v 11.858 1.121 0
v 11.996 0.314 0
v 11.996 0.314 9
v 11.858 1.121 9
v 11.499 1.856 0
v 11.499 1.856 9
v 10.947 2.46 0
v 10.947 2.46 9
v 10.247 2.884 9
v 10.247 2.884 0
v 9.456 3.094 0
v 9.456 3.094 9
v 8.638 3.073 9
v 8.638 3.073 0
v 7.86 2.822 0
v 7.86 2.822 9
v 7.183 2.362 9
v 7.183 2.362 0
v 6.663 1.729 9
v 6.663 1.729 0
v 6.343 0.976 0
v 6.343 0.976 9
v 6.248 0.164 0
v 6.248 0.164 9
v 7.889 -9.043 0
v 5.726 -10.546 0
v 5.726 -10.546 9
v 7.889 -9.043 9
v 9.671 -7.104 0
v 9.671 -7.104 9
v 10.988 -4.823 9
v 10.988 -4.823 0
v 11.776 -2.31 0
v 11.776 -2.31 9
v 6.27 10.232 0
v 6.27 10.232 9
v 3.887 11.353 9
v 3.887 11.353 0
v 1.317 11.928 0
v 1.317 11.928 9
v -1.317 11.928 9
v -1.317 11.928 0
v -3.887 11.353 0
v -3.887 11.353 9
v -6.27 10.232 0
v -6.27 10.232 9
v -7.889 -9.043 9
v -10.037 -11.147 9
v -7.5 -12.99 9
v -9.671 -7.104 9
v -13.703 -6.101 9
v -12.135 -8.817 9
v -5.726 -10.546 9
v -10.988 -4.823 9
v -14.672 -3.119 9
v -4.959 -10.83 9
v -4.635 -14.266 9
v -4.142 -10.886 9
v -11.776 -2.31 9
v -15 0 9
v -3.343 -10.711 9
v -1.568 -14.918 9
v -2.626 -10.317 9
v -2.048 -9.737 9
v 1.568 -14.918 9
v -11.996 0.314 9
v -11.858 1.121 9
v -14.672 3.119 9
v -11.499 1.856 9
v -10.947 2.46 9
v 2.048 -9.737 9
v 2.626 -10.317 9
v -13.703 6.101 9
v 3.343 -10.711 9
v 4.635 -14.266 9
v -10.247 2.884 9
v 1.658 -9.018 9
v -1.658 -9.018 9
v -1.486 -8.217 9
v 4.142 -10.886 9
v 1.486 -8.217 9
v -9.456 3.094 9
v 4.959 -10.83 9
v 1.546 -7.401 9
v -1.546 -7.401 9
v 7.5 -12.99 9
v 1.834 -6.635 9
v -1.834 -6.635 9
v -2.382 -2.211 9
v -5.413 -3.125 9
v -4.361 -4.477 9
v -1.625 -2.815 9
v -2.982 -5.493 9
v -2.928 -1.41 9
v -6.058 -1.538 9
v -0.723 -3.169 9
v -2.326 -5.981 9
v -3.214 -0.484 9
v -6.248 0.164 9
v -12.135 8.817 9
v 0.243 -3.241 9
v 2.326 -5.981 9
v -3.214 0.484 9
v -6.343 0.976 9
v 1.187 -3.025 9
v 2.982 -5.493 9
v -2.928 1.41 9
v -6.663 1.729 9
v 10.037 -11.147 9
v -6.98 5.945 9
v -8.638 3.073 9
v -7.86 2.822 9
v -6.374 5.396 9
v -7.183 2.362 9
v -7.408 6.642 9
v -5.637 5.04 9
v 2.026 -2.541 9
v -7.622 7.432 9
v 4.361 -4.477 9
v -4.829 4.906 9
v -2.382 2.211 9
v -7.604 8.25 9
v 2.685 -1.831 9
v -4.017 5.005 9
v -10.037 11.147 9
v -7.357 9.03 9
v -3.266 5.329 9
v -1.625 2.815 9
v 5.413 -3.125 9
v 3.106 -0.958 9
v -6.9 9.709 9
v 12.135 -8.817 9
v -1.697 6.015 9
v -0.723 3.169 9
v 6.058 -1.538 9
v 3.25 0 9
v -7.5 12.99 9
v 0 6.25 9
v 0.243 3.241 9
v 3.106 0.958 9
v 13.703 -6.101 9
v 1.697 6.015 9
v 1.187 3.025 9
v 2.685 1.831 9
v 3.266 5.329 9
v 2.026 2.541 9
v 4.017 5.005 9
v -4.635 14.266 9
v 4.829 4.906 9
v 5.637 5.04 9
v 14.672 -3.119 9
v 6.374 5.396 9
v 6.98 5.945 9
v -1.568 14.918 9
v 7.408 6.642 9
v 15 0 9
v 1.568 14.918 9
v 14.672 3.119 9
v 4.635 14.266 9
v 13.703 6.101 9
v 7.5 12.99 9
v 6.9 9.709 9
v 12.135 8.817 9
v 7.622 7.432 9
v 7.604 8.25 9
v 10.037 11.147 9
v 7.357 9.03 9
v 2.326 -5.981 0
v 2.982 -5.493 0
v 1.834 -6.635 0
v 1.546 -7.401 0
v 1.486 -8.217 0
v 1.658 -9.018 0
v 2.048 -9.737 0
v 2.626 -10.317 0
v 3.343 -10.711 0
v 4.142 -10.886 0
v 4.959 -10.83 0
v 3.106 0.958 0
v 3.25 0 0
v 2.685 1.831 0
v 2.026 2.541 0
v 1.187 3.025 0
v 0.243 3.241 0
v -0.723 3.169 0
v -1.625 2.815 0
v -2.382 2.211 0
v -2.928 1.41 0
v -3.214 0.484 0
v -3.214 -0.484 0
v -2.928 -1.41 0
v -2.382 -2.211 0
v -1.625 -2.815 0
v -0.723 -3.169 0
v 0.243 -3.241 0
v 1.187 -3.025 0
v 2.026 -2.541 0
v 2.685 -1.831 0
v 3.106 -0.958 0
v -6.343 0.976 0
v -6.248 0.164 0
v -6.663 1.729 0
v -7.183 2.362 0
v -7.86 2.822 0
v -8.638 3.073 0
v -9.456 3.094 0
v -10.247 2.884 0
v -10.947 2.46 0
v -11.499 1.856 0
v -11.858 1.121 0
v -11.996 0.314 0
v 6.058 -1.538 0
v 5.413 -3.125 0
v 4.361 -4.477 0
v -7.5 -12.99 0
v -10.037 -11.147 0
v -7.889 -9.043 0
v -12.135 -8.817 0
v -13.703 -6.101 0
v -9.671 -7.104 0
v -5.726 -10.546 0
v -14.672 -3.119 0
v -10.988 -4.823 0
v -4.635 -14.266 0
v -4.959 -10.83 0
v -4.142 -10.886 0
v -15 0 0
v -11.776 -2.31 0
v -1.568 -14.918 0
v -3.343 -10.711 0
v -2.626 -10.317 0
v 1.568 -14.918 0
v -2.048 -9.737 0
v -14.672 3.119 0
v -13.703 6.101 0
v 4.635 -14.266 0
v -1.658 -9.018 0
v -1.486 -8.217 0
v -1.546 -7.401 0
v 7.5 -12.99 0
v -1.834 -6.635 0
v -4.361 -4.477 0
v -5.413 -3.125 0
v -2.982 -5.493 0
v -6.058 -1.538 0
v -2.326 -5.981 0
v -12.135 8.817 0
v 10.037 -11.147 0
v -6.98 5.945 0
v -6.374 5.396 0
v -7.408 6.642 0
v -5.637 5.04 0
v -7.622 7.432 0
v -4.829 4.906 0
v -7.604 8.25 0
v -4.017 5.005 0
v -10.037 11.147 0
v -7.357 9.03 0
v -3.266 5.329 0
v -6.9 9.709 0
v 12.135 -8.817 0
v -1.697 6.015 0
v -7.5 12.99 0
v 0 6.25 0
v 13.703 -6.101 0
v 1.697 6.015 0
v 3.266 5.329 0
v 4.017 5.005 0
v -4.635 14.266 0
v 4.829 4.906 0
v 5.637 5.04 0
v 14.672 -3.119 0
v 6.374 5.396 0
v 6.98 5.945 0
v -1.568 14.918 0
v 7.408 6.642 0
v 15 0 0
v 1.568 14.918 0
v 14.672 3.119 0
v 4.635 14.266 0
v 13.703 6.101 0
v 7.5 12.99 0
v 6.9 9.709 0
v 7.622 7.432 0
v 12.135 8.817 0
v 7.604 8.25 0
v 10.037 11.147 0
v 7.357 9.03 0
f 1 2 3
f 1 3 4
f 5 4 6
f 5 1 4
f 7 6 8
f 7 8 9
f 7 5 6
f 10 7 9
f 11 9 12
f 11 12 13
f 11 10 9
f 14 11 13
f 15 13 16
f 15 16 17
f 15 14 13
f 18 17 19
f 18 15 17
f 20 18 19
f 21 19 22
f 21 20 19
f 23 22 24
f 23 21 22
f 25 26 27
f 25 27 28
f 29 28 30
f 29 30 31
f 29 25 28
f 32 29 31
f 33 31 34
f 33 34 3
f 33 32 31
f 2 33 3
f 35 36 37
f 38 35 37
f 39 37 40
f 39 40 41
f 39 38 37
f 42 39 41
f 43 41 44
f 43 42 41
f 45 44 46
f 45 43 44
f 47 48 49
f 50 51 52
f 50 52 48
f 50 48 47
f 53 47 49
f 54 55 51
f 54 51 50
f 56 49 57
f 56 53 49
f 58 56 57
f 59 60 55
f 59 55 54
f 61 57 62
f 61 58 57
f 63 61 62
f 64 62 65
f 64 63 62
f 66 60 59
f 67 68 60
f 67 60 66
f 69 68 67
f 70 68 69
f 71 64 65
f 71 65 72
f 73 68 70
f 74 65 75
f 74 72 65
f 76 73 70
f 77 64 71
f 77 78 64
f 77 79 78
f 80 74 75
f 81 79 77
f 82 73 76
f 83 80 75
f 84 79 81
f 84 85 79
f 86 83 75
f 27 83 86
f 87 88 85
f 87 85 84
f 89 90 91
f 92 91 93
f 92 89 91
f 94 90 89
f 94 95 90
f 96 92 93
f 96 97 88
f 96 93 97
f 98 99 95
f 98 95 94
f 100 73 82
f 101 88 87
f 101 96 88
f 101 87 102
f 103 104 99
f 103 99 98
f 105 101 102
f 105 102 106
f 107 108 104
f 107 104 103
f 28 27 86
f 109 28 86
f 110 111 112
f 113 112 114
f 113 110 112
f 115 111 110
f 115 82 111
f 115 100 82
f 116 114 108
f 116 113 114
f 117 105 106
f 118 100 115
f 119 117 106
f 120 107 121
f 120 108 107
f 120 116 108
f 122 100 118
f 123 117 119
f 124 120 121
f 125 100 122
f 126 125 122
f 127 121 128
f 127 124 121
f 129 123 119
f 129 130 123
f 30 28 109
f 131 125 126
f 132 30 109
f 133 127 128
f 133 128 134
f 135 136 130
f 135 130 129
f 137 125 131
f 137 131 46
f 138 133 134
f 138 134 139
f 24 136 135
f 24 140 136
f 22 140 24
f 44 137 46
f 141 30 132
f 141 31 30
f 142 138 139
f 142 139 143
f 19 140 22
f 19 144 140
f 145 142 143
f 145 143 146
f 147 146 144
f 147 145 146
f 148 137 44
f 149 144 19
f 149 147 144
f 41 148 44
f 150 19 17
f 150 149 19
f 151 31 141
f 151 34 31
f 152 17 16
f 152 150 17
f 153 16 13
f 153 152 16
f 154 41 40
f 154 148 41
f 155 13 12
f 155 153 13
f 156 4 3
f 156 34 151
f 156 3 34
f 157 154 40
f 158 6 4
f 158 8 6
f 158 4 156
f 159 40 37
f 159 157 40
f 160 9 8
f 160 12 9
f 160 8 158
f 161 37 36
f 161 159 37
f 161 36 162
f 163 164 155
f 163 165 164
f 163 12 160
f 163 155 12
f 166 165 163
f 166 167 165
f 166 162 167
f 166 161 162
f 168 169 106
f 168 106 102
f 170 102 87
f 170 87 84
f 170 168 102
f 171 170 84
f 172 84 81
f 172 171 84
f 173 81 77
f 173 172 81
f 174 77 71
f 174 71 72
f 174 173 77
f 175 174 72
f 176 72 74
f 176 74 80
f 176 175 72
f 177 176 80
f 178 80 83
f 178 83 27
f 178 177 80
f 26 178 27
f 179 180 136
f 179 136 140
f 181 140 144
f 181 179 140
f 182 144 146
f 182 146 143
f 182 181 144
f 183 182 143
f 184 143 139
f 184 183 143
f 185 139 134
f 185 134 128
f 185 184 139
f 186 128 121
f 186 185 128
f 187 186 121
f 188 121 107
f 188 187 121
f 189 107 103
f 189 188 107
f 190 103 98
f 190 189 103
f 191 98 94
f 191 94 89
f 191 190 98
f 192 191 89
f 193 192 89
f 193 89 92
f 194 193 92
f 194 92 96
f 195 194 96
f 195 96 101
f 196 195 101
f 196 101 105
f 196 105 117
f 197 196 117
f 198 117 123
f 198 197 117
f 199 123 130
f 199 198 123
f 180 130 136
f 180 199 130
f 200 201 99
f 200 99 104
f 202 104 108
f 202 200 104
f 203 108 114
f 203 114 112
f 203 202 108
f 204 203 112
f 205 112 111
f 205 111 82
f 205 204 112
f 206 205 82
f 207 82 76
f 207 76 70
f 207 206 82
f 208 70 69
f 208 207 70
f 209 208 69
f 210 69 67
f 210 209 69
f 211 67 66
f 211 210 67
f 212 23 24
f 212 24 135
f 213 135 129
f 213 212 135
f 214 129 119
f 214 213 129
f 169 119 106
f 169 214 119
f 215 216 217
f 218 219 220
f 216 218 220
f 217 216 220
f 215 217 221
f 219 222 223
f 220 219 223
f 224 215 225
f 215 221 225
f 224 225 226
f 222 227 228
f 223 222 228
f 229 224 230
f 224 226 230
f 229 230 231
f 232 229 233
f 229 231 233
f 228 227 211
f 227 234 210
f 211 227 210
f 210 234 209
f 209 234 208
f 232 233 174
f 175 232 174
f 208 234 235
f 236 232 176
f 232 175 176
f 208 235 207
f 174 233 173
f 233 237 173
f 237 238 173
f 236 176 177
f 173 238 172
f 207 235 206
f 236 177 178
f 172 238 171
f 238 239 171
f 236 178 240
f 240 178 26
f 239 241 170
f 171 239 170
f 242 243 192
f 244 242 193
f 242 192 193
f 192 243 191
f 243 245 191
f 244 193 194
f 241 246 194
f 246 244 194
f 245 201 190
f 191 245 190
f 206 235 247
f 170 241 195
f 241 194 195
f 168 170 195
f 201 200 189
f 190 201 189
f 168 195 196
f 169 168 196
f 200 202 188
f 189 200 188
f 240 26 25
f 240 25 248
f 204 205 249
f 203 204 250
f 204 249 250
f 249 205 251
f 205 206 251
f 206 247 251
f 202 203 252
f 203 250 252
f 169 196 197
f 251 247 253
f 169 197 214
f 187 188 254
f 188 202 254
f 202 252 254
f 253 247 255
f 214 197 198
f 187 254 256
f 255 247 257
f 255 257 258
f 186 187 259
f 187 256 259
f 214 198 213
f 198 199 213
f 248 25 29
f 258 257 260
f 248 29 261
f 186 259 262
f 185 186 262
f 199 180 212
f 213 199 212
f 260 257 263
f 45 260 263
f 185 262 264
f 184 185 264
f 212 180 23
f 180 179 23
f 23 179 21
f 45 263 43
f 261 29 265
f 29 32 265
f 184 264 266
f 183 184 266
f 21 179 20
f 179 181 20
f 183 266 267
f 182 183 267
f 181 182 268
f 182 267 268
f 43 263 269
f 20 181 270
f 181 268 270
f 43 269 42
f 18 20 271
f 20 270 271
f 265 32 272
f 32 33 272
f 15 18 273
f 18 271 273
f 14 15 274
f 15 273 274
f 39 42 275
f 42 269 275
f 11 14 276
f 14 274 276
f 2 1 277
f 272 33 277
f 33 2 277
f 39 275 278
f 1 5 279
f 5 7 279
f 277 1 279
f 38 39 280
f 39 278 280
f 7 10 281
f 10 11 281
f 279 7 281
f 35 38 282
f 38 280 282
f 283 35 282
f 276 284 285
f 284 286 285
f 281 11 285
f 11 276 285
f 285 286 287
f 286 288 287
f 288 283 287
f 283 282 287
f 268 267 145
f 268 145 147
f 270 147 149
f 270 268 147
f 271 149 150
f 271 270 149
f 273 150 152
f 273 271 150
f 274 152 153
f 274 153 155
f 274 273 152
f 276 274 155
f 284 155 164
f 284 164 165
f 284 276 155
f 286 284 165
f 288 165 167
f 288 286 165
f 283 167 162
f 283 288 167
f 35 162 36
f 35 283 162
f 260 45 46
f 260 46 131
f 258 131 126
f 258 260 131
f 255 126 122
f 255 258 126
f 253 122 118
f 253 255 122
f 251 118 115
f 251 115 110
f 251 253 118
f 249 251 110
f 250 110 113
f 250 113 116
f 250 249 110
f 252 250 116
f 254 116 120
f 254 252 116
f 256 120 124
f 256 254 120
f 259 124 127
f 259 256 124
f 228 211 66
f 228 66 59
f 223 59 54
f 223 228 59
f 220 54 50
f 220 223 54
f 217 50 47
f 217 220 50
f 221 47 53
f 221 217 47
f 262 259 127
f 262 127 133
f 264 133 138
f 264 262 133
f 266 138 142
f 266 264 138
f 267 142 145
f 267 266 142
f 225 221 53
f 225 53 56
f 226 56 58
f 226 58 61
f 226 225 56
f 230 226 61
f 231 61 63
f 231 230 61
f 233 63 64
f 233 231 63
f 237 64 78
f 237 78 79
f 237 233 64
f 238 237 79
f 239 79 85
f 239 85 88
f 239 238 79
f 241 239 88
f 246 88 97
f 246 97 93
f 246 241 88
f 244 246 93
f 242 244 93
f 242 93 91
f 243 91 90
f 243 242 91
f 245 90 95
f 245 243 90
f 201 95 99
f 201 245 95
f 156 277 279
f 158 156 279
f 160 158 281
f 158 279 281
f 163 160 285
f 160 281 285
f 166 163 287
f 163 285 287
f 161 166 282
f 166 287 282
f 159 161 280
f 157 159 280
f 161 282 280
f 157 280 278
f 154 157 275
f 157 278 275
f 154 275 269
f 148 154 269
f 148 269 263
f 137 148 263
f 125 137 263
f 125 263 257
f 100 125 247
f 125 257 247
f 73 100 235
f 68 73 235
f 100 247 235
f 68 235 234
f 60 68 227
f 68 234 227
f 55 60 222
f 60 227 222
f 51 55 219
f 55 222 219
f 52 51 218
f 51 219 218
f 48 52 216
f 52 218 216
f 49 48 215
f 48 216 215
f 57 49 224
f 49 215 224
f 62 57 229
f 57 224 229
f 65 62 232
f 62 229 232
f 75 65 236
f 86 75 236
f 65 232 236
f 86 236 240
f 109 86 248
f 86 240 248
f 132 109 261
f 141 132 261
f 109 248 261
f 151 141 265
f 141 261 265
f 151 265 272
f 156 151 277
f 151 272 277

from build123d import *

# Parameters (mm, degrees)
SKETCH_1_R      = 15
SKETCH_1_R_2    = 3.25
EXTRUDE_1_DEPTH = 9


with BuildPart() as part:
    # 草图1 → 凸台-拉伸1 (new body)
    with BuildSketch(Plane.XY):
        Circle(SKETCH_1_R)
        Circle(SKETCH_1_R_2, mode=Mode.SUBTRACT)
        with BuildLine():
            ThreePointArc((6.269982777, 10.231681972), (0, 12), (-6.269982777, 10.231681972))
            ThreePointArc((-6.269982777, 10.231681972), (-7.219139876, 6.278158126), (-3.265616029, 5.329001027))
            ThreePointArc((-3.265616029, 5.329001027), (0, 6.25), (3.265616029, 5.329001027))
            ThreePointArc((3.265616029, 5.329001027), (7.219139876, 6.278158126), (6.269982777, 10.231681972))
        make_face(mode=Mode.SUBTRACT)
        with BuildLine():
            ThreePointArc((5.725905123, -10.545805352), (10.392304845, -6), (11.9958879, 0.31412338))
            ThreePointArc((11.9958879, 0.31412338), (9.046614364, 3.112879463), (6.247858281, 0.163605927))
            ThreePointArc((6.247858281, 0.163605927), (5.412658774, -3.125), (2.982242252, -5.492606954))
            ThreePointArc((2.982242252, -5.492606954), (1.827474488, -9.391037589), (5.725905123, -10.545805352))
        make_face(mode=Mode.SUBTRACT)
        with BuildLine():
            ThreePointArc((-11.9958879, 0.31412338), (-10.392304845, -6), (-5.725905123, -10.545805352))
            ThreePointArc((-5.725905123, -10.545805352), (-1.827474488, -9.391037589), (-2.982242252, -5.492606954))
            ThreePointArc((-2.982242252, -5.492606954), (-5.412658774, -3.125), (-6.247858281, 0.163605927))
            ThreePointArc((-6.247858281, 0.163605927), (-9.046614364, 3.112879463), (-11.9958879, 0.31412338))
        make_face(mode=Mode.SUBTRACT)
    extrude(amount=EXTRUDE_1_DEPTH)


solid = part.part
